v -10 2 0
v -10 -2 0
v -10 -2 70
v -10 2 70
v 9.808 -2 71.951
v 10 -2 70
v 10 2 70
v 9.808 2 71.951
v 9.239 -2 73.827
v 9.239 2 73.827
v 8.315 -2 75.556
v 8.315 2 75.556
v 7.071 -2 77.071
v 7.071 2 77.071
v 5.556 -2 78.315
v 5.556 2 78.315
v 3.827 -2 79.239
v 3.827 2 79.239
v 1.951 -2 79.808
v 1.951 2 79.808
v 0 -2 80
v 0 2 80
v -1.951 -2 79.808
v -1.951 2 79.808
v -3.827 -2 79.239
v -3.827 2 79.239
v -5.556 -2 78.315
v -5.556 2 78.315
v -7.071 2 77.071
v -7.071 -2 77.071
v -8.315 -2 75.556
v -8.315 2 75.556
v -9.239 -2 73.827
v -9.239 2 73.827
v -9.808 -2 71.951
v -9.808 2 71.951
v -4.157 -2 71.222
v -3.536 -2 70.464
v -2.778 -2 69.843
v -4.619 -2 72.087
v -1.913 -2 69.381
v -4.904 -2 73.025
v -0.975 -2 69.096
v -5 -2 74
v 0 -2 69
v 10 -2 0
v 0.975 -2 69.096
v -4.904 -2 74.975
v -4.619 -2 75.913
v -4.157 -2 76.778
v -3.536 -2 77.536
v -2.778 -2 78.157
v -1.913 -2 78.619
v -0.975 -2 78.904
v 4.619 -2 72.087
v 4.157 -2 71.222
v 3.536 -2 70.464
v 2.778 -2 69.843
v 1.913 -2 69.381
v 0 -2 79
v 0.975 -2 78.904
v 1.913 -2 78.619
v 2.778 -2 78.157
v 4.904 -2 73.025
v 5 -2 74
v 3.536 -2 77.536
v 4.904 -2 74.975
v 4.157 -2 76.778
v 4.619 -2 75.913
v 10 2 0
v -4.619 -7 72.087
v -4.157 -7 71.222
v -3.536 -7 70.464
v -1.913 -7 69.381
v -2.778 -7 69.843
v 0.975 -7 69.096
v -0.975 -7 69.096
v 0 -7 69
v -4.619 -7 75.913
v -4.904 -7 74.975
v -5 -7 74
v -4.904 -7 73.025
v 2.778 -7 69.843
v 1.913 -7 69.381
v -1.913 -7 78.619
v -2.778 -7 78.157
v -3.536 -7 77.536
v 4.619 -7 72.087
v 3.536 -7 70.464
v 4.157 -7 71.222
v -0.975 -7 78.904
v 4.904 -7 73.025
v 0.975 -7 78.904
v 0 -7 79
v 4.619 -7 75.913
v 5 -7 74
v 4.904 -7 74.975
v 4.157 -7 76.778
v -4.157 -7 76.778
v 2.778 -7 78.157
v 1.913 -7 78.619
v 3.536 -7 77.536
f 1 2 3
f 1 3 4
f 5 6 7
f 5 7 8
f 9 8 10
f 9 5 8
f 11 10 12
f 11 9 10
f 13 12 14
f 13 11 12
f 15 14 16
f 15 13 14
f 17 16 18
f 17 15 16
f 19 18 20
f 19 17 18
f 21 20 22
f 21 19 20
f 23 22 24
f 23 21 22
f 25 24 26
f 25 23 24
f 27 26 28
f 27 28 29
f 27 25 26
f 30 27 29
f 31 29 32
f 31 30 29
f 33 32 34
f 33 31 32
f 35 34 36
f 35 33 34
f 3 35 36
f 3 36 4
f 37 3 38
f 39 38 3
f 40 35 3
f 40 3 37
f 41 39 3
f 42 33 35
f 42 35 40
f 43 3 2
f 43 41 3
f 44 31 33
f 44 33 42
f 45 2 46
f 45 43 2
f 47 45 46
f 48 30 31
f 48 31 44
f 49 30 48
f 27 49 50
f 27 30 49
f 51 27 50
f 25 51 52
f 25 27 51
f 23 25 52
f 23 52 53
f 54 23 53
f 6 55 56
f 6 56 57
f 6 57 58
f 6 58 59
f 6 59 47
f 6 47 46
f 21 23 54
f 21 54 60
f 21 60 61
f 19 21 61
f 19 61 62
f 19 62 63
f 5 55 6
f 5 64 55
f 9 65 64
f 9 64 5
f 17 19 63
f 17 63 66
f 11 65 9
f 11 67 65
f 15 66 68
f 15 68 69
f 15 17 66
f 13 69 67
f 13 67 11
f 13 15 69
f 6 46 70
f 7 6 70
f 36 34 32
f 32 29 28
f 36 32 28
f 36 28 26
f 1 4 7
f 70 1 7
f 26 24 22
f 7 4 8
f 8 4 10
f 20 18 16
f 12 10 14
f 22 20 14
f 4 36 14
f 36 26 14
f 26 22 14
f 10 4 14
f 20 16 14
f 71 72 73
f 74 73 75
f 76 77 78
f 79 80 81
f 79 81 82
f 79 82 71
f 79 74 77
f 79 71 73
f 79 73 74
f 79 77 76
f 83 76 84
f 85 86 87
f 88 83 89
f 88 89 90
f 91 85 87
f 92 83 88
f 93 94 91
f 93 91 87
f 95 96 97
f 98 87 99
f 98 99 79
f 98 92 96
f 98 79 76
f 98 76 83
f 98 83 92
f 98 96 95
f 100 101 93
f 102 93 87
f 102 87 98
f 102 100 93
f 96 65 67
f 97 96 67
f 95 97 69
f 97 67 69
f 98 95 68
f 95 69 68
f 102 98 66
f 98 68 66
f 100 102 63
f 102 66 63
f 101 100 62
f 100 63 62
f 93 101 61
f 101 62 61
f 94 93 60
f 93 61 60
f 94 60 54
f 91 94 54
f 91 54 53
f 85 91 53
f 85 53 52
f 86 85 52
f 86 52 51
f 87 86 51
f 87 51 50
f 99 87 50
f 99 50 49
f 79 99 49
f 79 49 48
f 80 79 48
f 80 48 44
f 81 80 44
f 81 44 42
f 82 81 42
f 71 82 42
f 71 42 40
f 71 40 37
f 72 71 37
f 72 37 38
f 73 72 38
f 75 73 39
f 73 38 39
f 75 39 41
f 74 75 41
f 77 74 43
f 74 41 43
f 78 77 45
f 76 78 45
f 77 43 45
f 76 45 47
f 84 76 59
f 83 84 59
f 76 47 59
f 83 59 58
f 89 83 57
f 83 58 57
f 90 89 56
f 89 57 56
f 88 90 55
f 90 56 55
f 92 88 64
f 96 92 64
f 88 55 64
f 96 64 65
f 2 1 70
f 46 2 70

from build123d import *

# Parameters (mm, degrees)
F0_W     = 20
F0_H     = 4
F1_DEPTH = 70
F3_DEPTH = 2
F4_R     = 5
F5_DEPTH = 25
F6_R     = 5
F7_DEPTH = 7


with BuildPart() as f1:
    # F0 (on Top) → F1 (new body)
    with BuildSketch(Plane.XY):
        Rectangle(F0_W, F0_H)
    extrude(amount=F1_DEPTH)

    # F2 (on Front) → F3 (join, symmetric)
    with BuildSketch(Plane.XZ):
        with BuildLine():
            Line((-10, 70), (10, 70))
            ThreePointArc((10, 70), (0, 80), (-10, 70))
        make_face()
    extrude(amount=F3_DEPTH, both=True)

    # F4 (on Front) → F5 (cut)
    with BuildSketch(Plane.XZ):
        with Locations((0, 74)):
            Circle(F4_R)
    extrude(amount=F5_DEPTH, mode=Mode.SUBTRACT)

    # F6 (on face) → F7 (join)
    with BuildSketch(Plane.XZ):
        with Locations((0, 74)):
            Circle(F6_R)
    extrude(amount=F7_DEPTH)


solid = f1.part
